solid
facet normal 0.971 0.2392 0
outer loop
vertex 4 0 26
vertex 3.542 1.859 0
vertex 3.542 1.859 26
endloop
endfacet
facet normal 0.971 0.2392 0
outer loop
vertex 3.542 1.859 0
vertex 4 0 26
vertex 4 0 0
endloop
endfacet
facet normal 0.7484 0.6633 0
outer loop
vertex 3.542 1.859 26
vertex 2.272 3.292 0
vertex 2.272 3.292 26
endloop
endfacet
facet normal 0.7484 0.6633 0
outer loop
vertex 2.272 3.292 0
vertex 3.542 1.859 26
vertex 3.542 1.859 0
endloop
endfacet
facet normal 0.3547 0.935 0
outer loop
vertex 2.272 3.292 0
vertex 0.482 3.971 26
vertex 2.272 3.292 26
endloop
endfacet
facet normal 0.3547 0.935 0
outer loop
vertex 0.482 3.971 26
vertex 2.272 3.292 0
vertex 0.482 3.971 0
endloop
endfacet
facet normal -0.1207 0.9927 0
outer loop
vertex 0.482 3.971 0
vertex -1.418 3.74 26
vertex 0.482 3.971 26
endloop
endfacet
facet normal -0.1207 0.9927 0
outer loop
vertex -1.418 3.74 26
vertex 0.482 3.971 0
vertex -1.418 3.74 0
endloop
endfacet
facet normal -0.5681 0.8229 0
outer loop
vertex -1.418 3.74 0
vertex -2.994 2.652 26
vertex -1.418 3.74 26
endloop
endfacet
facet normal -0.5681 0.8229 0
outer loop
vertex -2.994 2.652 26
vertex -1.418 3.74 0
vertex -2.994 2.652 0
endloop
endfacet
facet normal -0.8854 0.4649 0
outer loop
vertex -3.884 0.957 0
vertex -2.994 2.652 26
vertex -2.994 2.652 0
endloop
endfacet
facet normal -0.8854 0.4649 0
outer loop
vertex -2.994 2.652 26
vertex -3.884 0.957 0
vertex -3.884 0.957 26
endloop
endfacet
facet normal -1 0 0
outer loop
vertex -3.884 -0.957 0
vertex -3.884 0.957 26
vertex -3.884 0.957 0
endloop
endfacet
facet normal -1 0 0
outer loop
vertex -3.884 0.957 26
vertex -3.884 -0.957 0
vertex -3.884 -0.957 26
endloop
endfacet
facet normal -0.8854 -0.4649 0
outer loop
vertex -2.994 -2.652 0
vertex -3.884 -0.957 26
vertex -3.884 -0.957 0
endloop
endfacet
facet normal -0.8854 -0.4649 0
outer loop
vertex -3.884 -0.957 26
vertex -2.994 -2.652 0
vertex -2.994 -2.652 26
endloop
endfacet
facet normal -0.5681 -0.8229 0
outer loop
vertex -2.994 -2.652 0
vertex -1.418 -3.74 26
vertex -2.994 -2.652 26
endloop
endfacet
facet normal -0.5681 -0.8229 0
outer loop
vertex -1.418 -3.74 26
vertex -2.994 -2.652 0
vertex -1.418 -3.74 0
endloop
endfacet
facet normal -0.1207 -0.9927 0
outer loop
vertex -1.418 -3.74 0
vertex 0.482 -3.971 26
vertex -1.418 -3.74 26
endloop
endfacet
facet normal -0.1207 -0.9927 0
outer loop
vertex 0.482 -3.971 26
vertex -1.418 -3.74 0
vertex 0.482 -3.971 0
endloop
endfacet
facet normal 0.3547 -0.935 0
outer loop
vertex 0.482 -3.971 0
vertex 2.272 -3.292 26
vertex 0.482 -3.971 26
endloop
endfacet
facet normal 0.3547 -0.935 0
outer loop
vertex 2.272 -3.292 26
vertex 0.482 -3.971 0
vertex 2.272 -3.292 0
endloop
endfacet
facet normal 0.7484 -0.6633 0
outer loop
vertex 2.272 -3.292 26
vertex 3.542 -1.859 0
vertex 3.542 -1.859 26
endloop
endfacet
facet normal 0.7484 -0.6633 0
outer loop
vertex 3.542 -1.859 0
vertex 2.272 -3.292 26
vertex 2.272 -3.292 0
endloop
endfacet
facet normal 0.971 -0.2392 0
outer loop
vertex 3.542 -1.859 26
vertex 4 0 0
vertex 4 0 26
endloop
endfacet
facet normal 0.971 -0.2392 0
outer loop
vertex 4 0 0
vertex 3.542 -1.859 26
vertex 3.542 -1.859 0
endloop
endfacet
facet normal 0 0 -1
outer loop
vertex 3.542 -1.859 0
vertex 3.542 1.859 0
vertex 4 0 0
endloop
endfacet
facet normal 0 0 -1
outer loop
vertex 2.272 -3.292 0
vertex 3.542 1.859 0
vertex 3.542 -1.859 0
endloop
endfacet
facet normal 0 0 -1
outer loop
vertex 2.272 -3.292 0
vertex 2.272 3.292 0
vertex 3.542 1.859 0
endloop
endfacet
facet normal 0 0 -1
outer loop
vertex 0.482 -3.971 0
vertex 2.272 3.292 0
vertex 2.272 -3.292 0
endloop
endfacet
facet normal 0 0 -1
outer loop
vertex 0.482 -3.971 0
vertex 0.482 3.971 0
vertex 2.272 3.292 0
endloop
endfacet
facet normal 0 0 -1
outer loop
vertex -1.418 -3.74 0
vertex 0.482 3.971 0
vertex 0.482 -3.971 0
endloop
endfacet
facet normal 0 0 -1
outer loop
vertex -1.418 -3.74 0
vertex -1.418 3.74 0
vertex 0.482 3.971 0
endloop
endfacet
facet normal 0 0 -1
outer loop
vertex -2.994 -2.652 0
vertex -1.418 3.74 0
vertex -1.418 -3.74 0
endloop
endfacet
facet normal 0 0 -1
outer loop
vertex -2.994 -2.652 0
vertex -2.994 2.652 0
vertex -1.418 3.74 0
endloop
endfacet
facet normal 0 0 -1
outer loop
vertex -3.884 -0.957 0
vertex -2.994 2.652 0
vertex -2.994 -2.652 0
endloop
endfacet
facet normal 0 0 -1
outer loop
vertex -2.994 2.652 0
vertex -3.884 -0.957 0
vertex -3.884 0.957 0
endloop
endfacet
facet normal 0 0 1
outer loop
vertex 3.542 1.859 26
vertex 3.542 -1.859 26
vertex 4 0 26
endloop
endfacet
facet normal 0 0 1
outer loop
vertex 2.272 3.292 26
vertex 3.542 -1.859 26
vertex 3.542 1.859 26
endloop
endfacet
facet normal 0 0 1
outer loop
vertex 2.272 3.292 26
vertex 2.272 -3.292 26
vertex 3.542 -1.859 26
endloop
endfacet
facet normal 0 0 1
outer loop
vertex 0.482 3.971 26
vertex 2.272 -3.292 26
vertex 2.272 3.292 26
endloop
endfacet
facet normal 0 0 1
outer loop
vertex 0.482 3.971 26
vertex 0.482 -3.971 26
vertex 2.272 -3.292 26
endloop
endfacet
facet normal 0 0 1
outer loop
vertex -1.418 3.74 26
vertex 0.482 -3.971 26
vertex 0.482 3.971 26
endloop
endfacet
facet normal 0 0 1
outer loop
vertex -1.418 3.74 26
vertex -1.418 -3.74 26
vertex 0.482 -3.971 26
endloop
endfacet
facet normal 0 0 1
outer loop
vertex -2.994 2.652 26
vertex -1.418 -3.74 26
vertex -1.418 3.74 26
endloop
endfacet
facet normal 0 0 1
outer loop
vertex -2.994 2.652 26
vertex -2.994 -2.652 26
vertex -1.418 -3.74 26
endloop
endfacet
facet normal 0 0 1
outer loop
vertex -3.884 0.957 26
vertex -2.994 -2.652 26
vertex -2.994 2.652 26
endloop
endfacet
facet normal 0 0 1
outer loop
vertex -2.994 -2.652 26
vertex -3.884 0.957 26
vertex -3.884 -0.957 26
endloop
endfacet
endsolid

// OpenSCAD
module front_cylinder_upright() {
    cylinder(h=26.0, r=4);
}

// call module when run directly
front_cylinder_upright();
